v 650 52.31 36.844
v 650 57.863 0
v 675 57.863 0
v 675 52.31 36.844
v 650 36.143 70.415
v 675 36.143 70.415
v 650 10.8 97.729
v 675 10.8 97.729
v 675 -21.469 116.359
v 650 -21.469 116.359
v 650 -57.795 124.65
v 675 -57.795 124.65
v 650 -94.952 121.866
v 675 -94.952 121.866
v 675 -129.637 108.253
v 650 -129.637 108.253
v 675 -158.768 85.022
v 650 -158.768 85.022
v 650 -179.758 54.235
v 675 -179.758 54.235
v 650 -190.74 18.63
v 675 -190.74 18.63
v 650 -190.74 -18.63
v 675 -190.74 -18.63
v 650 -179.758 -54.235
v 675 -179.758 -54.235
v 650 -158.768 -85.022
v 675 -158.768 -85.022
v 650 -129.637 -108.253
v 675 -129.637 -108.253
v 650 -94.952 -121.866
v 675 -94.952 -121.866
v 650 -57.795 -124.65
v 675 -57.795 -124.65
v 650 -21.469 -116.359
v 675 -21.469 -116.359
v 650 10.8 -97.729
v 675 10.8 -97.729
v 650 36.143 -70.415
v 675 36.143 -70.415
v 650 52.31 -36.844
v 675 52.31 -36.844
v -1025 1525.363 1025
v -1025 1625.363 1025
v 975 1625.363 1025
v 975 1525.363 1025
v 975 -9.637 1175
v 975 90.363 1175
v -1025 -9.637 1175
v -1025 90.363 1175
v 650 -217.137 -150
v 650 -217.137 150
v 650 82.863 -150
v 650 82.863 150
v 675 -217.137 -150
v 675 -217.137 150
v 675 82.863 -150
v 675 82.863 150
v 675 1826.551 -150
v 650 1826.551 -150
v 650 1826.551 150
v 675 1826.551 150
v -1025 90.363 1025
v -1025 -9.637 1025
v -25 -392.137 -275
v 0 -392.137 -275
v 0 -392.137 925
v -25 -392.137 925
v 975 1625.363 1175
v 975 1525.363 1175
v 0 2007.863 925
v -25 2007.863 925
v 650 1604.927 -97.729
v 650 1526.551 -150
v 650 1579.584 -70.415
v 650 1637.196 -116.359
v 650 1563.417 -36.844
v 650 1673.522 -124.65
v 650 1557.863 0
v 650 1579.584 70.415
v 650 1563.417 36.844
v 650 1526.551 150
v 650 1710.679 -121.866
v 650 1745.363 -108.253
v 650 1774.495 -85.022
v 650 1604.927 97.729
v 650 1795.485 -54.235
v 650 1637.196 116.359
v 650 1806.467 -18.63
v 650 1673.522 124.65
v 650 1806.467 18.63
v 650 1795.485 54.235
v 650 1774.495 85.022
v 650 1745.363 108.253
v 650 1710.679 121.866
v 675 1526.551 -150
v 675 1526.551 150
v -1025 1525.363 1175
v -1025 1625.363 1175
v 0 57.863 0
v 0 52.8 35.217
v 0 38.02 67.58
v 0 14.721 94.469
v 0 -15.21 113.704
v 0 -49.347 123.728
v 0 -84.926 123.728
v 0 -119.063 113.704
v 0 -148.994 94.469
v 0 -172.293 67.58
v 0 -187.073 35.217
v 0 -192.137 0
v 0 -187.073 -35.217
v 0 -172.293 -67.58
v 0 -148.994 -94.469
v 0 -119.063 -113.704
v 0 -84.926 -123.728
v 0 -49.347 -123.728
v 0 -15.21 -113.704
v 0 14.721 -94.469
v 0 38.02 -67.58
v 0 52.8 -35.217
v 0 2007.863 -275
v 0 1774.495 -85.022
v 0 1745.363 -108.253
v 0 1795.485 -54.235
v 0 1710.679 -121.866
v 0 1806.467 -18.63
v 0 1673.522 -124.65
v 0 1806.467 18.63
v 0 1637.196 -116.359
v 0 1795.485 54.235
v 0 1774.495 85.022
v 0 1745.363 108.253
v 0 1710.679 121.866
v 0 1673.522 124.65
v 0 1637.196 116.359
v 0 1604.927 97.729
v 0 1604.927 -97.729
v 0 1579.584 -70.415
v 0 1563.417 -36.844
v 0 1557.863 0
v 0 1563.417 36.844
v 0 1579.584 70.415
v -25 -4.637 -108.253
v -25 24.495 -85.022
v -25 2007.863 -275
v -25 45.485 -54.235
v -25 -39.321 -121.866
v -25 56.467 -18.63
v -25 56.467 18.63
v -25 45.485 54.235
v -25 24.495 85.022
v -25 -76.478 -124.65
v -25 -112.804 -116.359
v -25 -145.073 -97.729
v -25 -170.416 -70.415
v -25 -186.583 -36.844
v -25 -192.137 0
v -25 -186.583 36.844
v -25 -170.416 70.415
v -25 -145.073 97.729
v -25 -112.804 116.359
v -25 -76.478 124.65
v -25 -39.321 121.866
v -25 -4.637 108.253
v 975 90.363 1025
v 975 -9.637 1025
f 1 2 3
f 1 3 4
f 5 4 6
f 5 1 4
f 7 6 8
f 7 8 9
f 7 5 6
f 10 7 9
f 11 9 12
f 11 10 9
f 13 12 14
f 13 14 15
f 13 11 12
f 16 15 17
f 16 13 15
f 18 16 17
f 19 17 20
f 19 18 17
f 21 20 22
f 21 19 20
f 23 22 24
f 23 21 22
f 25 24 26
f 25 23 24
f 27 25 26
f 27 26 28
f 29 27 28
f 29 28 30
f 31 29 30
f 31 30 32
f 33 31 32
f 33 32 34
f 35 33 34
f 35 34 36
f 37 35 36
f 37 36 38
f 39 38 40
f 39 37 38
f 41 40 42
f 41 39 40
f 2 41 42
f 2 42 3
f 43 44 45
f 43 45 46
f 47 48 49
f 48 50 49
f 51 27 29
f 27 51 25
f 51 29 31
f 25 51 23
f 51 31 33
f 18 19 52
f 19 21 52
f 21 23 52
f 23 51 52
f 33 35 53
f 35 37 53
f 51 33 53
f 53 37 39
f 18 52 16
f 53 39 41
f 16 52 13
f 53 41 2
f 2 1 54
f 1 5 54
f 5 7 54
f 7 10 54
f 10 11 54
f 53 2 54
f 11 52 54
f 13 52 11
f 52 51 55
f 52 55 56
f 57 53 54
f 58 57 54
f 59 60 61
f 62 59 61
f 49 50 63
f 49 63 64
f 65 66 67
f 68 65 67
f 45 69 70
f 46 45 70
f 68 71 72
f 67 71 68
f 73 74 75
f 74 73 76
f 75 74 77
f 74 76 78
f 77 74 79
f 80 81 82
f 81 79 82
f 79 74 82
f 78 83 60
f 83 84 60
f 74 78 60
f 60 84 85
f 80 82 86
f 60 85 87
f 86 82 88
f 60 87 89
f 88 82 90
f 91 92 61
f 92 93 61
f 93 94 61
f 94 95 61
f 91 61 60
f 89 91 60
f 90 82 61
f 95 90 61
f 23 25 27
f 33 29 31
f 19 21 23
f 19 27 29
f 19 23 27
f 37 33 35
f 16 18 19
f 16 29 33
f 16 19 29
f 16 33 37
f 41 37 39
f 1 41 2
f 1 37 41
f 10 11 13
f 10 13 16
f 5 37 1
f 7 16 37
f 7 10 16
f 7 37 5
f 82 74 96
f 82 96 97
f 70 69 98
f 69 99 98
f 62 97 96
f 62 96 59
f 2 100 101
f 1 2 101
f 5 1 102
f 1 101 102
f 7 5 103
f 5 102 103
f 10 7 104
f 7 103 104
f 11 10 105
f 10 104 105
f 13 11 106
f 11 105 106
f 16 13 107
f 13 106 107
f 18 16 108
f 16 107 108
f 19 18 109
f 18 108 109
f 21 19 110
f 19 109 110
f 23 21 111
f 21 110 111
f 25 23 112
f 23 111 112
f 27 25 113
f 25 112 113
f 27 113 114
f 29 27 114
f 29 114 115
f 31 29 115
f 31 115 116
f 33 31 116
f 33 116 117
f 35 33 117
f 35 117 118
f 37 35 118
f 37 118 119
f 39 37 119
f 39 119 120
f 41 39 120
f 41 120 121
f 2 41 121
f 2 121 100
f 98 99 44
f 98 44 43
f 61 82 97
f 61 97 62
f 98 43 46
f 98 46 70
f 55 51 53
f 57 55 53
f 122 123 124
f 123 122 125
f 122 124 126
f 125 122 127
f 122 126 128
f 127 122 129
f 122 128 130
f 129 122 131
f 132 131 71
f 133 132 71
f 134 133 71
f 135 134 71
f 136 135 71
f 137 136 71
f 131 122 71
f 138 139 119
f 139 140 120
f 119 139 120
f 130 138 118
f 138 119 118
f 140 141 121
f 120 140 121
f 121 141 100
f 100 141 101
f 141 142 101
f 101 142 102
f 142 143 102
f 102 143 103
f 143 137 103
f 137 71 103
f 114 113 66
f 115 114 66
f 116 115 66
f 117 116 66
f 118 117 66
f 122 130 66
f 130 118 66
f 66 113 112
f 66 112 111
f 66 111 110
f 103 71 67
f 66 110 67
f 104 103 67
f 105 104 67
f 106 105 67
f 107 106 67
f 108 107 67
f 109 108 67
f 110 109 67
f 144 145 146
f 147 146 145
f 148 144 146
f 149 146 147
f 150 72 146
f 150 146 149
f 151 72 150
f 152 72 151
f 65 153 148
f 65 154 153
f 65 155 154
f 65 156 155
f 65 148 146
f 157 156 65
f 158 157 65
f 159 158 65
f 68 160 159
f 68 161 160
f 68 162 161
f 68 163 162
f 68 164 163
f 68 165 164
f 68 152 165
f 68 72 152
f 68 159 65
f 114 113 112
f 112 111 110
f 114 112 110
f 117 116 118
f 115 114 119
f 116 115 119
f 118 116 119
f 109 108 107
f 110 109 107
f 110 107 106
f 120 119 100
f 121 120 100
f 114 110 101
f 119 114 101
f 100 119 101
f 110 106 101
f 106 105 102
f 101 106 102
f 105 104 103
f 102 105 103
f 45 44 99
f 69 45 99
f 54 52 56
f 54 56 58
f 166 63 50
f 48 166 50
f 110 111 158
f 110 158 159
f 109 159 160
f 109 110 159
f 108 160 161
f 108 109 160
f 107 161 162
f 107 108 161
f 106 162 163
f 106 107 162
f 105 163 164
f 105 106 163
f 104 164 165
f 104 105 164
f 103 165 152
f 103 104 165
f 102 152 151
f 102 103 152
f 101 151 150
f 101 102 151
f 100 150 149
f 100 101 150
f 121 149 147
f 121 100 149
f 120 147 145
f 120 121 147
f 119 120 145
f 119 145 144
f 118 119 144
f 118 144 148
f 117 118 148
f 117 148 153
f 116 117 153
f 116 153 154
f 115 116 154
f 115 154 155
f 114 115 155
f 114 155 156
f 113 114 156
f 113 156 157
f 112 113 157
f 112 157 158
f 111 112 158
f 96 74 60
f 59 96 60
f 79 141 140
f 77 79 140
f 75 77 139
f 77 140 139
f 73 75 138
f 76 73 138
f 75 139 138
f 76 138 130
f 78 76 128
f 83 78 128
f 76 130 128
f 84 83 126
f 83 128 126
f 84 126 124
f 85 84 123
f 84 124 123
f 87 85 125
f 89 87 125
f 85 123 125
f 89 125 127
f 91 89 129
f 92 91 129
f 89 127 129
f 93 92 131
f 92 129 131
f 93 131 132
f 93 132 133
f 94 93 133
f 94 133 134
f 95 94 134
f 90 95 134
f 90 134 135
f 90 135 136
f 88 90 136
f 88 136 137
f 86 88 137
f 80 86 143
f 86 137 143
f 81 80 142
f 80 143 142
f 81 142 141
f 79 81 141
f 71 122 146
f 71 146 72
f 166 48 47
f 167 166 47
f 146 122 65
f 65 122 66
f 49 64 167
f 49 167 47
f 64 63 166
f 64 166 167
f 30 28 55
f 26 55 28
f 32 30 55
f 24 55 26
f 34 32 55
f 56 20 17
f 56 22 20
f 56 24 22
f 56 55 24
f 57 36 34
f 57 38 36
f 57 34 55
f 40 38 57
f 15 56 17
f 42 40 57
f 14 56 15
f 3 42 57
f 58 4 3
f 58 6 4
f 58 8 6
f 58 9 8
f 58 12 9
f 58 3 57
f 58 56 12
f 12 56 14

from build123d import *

# Parameters (mm, degrees)
F0_R     = 125
F1_DEPTH = 650
F2_W     = 300
F2_H     = 300
F3_DEPTH = 25
F2_R     = 125
F5_W     = 2400
F5_H     = 1200
F5_R     = 125
F6_DEPTH = 25
F7_W     = 100
F7_H     = 150
F8_DEPTH = 1000
F9_DEPTH = 1000


with BuildPart() as f1:
    # F0 (on Right) → F1 (new body)
    with BuildSketch(Plane.YZ):
        with Locations((-67.136593163, 0)):
            Circle(F0_R)
    extrude(amount=F1_DEPTH)

    # F2 (on face) → F3, piece 2 (join)
    with BuildSketch(Plane.YZ.offset(650)):
        with Locations((-67.136593163, 0)):
            Rectangle(F2_W, F2_H)
        with Locations((-67.136593163, 0)):
            Circle(F2_R, mode=Mode.SUBTRACT)
    extrude(amount=F3_DEPTH)


with BuildPart() as f1b:
    # F0 (on Right) → F1, piece 2 (new body)
    with BuildSketch(Plane.YZ):
        with BuildLine():
            ThreePointArc((1807.863406837, 0), (1682.863406837, 125), (1557.863406837, 0))
            ThreePointArc((1557.863406837, 0), (1682.863406837, -125), (1807.863406837, 0))
        make_face()
    extrude(amount=F1_DEPTH)

    # F2 (on face) → F3 (join)
    with BuildSketch(Plane.YZ.offset(650)):
        with Locations((1676.5514612198, 0)):
            Rectangle(F2_W, F2_H)
    extrude(amount=F3_DEPTH)


with BuildPart() as f1_1:
    add(f1.part)

    # F4: union F1b
    add(f1b.part)

    # F5 (on face) → F6 (join)
    with BuildSketch(Plane(origin=(0, 0, 0), x_dir=(0, -1, 0), z_dir=(-1, 0, 0))):
        with Locations((-807.863406837, 325)):
            Rectangle(F5_W, F5_H)
        with Locations((67.136593163, 0)):
            Circle(F5_R, mode=Mode.SUBTRACT)
    extrude(amount=F6_DEPTH)


with BuildPart() as f8:
    # F7 (on face) → F8 (new body)
    with BuildSketch(Plane(origin=(-25, 0, 0), x_dir=(0, -1, 0), z_dir=(-1, 0, 0))):
        with Locations((-1575.363406837, 1100)):
            Rectangle(F7_W, F7_H)
    extrude(amount=F8_DEPTH)

    # F7 (on face) → F9, piece 2 (join)
    with BuildSketch(Plane(origin=(-25, 0, 0), x_dir=(0, -1, 0), z_dir=(-1, 0, 0))):
        with Locations((-1575.363406837, 1100)):
            Rectangle(F7_W, F7_H)
    extrude(amount=-F9_DEPTH)


with BuildPart() as f8b:
    # F7 (on face) → F8, piece 2 (new body)
    with BuildSketch(Plane(origin=(-25, 0, 0), x_dir=(0, -1, 0), z_dir=(-1, 0, 0))):
        with Locations((-40.363406837, 1100)):
            Rectangle(F7_W, F7_H)
    extrude(amount=F8_DEPTH)

    # F7 (on face) → F9 (join)
    with BuildSketch(Plane(origin=(-25, 0, 0), x_dir=(0, -1, 0), z_dir=(-1, 0, 0))):
        with Locations((-40.363406837, 1100)):
            Rectangle(F7_W, F7_H)
    extrude(amount=-F9_DEPTH)


solid = Compound([f1_1.part, f8.part, f8b.part])
